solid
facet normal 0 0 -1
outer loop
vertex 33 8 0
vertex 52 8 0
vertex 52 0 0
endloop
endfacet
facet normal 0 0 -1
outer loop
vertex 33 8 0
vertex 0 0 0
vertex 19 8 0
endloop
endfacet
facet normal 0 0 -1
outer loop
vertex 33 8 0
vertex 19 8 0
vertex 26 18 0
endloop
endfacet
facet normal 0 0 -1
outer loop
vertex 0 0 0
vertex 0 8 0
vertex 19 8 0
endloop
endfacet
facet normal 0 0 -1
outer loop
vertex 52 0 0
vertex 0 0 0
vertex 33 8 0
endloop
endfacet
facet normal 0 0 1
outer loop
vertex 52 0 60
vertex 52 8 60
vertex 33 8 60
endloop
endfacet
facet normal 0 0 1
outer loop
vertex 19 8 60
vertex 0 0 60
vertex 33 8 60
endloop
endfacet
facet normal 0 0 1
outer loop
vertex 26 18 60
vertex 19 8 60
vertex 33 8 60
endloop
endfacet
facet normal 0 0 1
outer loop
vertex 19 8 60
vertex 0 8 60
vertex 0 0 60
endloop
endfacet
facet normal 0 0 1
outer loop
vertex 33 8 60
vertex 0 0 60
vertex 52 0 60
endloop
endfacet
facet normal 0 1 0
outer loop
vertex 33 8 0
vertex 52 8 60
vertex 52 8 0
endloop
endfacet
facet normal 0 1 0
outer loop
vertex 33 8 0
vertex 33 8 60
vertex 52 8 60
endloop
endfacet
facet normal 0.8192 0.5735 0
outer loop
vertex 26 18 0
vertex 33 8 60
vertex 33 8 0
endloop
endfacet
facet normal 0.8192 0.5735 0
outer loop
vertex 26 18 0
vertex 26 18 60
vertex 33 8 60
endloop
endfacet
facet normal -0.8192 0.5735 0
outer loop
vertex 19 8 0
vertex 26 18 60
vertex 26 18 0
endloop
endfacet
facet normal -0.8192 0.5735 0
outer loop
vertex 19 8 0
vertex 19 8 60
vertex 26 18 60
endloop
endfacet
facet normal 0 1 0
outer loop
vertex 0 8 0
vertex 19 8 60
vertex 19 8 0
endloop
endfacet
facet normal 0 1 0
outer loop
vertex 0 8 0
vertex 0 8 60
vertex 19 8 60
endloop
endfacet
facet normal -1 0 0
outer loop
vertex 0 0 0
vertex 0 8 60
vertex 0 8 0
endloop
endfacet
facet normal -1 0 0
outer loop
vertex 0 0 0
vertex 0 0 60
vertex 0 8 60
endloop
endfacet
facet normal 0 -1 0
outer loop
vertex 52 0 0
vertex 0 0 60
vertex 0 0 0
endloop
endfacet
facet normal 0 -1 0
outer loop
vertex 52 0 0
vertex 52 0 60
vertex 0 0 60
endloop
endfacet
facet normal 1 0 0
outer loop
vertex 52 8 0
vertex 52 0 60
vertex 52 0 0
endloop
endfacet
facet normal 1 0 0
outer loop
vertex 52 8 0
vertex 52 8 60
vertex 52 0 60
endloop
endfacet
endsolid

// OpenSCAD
$fn = 32;

// ----------------------------------------------------------------------
// V guide rail: vrib, 52 mm wide
// ----------------------------------------------------------------------

// --- parameters (mm) ---
rail_w = 52;              // rail width, X
base_t = 8;               // base plate thickness
v_depth = 10;             // V feature depth / height
v_half_w = 7;             // half width of the V at the base face
plate_t = 60;             // rail length, Z (the extrusion height)

profile = [[0, 0], [52, 0], [52, 8], [33, 8], [26, 18], [19, 8], [0, 8]];  // primary outline, 7 points, counter clockwise

// --- the one profile operation ---
linear_extrude(height = plate_t) polygon(points = profile);
